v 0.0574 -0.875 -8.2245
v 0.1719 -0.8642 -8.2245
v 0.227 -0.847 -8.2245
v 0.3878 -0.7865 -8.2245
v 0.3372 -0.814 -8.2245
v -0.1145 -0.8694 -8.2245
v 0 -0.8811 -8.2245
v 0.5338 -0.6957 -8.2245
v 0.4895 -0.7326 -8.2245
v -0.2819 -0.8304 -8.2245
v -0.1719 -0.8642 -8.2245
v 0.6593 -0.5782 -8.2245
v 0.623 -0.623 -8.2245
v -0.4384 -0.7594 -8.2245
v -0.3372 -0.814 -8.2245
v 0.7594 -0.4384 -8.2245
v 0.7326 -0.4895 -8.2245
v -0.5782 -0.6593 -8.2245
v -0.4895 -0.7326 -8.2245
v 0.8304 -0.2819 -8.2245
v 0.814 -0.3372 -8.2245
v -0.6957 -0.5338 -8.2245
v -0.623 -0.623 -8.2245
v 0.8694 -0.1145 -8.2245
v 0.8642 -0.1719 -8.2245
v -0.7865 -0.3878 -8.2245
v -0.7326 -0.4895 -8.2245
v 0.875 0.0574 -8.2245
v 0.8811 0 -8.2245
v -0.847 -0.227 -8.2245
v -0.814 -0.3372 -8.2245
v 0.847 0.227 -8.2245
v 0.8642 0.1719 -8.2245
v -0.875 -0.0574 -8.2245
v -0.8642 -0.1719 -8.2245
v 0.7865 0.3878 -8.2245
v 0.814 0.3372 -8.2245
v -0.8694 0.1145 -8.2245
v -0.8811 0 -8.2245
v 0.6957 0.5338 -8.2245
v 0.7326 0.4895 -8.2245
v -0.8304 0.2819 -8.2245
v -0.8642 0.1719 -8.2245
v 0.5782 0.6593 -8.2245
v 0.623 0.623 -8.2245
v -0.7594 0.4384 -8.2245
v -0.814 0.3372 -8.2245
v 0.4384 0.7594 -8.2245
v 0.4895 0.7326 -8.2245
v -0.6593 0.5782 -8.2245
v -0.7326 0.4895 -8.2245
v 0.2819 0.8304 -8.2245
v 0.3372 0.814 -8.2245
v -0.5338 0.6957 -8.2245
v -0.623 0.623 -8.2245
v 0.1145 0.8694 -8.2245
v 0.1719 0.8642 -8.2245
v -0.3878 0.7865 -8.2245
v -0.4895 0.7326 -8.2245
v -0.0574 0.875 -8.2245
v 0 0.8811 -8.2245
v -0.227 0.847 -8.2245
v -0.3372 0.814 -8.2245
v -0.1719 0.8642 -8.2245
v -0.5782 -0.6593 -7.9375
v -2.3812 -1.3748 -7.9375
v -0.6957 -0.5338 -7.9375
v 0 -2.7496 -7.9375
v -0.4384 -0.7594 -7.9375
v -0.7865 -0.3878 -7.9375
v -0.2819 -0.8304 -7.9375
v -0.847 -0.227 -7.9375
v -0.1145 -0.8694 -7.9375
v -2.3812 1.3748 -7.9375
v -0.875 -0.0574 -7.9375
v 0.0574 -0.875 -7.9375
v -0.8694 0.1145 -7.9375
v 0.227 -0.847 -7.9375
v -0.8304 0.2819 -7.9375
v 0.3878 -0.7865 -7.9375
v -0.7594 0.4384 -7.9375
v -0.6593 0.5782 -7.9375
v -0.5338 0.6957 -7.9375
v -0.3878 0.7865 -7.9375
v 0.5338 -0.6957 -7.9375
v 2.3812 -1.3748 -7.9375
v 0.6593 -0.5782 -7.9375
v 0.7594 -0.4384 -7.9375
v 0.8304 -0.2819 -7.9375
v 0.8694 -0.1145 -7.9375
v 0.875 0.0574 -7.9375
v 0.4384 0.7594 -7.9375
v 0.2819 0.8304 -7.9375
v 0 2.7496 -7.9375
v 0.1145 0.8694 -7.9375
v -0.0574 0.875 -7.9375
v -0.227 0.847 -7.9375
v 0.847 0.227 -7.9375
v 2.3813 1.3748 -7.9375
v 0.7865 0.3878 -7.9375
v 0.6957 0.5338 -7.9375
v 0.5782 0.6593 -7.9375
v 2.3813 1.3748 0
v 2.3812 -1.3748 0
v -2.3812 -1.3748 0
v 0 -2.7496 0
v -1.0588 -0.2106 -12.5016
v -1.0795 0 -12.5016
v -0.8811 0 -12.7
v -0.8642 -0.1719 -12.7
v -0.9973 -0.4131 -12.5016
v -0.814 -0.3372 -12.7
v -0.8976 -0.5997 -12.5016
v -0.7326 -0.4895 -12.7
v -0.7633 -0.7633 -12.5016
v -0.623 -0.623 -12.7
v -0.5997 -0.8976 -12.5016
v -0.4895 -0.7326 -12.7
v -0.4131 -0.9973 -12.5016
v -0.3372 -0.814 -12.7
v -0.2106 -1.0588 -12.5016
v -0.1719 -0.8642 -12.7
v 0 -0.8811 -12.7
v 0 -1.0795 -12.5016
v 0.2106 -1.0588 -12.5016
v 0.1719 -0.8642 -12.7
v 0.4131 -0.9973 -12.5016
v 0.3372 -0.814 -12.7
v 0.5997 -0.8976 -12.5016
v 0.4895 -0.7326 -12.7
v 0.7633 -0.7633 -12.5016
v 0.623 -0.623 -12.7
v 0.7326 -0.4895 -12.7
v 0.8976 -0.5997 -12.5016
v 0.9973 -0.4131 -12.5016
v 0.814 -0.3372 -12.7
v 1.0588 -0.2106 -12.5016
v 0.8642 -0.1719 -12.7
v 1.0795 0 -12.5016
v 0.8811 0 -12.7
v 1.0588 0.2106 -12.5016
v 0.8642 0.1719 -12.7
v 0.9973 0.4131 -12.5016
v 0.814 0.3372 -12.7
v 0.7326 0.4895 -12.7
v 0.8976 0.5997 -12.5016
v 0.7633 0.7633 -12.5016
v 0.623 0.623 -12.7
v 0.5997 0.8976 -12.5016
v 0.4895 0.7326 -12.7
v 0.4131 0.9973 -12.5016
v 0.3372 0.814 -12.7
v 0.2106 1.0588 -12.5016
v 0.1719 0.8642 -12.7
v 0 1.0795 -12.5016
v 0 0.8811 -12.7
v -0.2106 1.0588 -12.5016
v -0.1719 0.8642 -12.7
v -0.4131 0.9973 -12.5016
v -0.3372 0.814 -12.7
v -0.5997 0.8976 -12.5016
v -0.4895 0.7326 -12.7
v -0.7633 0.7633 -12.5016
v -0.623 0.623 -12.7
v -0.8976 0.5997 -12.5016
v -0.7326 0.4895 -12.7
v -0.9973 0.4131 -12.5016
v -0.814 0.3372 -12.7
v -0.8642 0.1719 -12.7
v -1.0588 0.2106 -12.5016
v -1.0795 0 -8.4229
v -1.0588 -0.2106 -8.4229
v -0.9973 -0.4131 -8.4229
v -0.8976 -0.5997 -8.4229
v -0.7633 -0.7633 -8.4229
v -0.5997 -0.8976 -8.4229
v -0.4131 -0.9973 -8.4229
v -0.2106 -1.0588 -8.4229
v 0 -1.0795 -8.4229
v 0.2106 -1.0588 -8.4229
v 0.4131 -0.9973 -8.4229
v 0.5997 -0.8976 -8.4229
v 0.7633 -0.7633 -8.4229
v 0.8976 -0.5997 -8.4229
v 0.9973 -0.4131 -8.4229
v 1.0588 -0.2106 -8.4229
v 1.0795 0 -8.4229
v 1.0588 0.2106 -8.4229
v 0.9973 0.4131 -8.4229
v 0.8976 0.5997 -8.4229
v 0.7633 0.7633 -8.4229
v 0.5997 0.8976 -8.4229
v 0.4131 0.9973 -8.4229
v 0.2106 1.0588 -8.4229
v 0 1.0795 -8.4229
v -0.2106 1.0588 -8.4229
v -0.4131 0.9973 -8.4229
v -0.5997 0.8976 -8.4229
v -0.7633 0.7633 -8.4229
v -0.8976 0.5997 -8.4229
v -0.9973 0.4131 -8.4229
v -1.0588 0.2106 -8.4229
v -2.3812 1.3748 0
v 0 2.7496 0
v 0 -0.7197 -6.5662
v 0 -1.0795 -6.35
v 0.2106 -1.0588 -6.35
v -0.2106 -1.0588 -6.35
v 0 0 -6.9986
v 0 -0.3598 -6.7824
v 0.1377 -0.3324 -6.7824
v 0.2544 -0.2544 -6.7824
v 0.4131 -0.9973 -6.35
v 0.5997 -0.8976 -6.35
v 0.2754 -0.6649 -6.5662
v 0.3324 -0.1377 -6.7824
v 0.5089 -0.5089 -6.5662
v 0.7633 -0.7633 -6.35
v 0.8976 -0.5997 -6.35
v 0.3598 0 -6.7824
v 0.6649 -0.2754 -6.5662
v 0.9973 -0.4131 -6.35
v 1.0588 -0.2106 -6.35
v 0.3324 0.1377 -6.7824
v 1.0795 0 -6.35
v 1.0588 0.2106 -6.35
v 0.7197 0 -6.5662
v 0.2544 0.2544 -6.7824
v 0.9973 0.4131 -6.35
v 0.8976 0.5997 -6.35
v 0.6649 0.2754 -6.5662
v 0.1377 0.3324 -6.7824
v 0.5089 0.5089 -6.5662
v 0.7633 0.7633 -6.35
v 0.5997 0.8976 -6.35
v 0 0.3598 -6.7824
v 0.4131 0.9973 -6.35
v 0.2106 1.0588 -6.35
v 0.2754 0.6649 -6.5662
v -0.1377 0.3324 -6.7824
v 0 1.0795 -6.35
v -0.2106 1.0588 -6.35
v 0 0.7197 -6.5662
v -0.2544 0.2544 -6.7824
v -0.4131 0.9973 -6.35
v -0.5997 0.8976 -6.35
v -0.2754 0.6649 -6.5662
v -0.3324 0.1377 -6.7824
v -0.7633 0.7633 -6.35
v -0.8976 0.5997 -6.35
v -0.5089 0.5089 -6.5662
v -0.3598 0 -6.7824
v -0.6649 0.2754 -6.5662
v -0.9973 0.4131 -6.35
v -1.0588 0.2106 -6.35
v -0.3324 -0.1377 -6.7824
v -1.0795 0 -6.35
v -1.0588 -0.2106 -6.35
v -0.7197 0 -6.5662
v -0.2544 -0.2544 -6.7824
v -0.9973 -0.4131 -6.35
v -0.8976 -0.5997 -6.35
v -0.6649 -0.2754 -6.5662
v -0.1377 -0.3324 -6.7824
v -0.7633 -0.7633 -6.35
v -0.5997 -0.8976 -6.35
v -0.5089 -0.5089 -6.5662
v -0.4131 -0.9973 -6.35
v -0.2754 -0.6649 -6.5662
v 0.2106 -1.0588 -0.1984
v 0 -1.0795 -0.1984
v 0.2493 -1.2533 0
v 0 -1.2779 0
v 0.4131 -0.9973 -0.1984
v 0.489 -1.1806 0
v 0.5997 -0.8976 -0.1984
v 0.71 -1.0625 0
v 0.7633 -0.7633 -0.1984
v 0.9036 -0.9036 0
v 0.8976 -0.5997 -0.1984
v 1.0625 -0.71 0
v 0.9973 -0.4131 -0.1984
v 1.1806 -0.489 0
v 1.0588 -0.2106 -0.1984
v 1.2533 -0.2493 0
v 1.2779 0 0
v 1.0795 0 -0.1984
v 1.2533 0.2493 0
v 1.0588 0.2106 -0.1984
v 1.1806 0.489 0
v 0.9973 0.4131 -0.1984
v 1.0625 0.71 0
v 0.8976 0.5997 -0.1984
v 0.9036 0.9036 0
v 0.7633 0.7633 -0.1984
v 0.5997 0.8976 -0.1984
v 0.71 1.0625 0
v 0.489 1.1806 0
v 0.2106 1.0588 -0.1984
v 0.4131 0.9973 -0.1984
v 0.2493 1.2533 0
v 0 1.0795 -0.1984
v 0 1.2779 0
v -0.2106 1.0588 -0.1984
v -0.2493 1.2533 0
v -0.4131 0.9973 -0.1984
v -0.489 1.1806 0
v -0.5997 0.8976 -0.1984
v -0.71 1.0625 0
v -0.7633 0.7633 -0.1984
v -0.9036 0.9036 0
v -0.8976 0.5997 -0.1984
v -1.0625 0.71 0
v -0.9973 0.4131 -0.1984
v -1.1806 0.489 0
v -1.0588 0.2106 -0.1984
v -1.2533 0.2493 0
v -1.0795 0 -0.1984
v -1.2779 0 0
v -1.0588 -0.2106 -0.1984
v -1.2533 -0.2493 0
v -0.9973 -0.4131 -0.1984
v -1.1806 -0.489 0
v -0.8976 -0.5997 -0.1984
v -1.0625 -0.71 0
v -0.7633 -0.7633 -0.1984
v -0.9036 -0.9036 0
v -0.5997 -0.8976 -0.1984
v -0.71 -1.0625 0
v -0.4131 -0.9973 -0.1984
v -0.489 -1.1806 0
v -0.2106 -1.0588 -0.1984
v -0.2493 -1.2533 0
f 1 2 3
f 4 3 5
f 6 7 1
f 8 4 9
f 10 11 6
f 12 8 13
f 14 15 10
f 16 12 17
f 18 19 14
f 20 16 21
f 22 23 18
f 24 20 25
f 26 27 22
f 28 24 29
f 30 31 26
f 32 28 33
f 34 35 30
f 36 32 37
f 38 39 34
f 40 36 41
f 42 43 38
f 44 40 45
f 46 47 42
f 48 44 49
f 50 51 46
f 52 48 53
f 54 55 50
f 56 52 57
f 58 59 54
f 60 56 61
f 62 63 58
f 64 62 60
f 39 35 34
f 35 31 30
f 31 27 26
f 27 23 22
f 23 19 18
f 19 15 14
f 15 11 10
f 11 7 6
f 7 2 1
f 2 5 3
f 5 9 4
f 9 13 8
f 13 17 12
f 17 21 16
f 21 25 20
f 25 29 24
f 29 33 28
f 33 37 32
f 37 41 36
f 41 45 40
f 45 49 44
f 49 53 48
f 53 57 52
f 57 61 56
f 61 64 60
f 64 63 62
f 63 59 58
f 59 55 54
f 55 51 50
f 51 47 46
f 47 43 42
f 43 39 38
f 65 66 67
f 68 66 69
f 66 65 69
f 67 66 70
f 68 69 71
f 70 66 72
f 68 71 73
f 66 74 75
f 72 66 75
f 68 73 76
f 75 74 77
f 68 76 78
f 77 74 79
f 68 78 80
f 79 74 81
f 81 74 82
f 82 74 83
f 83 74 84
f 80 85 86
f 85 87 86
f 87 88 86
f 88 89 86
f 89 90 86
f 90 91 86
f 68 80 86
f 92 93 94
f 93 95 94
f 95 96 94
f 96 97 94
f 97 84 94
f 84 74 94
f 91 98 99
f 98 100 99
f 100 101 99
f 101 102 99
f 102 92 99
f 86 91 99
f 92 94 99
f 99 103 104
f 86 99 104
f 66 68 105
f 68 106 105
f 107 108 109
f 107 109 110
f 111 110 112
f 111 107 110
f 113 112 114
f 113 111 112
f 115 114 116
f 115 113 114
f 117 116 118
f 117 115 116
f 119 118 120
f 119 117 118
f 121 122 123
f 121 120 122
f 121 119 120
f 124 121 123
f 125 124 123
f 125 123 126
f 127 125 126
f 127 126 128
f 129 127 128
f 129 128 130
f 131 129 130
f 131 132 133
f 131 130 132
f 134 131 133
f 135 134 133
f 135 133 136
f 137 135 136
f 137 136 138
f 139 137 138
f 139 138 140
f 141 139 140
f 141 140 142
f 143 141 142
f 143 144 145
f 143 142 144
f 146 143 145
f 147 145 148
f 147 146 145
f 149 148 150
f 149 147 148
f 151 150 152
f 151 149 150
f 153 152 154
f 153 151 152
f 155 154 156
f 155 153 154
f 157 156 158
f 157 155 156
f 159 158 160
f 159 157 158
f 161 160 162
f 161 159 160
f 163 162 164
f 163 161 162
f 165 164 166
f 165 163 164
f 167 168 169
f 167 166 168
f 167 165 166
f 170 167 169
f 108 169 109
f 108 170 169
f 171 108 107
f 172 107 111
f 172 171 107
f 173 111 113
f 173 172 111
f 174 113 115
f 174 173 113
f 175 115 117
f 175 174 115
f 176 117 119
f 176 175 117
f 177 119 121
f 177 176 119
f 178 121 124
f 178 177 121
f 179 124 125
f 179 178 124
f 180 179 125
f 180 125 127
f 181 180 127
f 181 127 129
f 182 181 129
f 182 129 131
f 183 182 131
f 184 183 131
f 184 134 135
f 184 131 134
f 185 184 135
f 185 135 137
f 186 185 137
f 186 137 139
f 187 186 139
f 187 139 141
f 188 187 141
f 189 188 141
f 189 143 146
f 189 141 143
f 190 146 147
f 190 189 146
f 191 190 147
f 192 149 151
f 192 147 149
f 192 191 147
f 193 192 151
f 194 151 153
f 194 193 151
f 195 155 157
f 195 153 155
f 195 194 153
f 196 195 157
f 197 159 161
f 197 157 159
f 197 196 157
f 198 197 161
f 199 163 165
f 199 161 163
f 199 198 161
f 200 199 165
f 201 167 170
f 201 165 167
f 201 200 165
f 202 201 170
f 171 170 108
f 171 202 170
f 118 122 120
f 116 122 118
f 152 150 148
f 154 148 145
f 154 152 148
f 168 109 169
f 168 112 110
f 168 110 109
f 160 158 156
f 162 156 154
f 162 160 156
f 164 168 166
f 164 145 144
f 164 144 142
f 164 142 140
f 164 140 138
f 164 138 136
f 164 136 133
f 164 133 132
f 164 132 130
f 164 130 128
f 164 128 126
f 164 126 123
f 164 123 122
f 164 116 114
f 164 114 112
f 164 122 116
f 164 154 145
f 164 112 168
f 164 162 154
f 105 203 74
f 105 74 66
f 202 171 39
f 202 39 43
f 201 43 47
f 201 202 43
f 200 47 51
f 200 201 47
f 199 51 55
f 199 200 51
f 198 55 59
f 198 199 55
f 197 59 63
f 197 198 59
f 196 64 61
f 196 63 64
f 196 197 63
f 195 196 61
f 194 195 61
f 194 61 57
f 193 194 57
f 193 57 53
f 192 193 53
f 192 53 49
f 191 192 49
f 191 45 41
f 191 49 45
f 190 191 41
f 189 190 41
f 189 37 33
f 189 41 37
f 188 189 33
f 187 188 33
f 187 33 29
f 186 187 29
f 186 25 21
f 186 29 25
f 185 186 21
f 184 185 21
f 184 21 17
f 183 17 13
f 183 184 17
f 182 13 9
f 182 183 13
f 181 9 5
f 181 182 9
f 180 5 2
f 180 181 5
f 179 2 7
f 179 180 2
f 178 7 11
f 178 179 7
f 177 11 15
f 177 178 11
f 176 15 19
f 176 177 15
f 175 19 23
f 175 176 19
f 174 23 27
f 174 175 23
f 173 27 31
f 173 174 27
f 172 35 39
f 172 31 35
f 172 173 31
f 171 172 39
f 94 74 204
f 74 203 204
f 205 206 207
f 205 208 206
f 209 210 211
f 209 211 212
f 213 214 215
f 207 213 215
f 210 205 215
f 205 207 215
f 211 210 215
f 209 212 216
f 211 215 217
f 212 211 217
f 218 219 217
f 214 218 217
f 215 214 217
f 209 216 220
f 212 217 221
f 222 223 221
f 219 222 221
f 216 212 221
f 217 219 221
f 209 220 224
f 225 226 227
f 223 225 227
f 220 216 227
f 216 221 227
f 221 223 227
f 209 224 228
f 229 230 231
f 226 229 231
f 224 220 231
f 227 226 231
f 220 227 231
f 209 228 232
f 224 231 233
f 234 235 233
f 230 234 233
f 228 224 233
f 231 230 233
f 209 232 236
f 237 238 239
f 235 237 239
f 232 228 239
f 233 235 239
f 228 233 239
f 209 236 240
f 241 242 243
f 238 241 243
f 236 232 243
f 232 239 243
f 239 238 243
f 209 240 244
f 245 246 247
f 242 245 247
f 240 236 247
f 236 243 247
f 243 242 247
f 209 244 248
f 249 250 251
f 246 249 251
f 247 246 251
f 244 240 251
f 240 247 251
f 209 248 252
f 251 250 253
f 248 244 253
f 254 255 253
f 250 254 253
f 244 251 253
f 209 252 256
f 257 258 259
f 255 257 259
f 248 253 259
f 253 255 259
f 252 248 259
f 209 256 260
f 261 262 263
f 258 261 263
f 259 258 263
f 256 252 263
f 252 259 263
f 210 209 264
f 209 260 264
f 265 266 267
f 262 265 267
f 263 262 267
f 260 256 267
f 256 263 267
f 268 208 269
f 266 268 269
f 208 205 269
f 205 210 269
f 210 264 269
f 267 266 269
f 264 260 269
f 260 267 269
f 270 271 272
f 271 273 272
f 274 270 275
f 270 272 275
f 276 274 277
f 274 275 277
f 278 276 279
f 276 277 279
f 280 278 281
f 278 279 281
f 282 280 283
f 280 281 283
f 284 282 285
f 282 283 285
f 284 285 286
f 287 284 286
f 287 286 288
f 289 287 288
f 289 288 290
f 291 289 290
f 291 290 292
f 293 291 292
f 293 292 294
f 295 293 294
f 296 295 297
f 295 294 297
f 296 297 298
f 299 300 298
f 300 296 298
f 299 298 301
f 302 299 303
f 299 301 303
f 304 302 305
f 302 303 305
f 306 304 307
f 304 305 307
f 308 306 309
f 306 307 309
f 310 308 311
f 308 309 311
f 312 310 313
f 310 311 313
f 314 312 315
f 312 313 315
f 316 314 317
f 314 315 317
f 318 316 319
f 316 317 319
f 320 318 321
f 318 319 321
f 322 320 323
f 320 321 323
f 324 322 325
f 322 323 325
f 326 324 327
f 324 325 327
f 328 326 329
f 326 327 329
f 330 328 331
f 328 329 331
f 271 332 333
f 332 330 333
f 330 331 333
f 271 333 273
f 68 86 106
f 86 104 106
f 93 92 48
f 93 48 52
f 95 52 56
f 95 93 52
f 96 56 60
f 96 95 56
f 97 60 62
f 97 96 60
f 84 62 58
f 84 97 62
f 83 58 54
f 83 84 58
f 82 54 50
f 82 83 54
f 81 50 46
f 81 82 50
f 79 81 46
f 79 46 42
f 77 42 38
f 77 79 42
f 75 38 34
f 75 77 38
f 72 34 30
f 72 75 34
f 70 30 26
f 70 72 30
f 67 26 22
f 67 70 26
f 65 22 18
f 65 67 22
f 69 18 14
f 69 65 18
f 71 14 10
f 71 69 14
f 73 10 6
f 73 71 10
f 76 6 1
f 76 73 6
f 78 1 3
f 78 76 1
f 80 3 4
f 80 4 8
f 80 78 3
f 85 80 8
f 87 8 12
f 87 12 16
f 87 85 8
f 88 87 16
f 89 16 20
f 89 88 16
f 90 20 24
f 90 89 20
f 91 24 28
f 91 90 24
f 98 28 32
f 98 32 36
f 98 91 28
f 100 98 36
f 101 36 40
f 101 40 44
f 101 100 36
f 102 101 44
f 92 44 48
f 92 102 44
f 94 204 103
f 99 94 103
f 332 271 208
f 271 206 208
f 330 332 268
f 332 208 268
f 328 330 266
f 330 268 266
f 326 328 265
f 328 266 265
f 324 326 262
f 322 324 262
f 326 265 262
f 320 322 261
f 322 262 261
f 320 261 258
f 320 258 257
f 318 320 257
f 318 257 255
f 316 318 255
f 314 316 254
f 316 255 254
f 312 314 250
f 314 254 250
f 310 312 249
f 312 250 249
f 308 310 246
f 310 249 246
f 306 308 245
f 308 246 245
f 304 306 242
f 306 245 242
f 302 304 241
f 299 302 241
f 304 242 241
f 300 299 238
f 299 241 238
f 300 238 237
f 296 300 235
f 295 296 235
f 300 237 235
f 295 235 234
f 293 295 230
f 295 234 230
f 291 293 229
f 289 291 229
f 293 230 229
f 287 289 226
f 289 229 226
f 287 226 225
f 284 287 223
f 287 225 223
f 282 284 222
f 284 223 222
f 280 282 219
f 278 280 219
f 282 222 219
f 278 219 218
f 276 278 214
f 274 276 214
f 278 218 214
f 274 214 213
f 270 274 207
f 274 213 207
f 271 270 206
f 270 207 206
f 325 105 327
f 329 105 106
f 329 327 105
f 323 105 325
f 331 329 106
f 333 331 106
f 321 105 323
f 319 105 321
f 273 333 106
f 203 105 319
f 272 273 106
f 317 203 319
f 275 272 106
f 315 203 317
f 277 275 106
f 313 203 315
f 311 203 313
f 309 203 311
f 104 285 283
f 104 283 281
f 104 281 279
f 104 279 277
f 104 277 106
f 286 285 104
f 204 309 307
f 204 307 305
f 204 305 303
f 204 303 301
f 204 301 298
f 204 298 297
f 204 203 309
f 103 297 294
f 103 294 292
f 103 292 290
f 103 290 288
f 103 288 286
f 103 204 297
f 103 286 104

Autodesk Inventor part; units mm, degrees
ref_plane "YZ Plane" through (0, 0, 0) normal (1, 0, 0) x (0, 1, 0)
ref_plane "XZ Plane" through (0, 0, 0) normal (0, 1, 0) x (-1, 0, 0)
sketch "Sketch2" plane through (0, 0, 0) normal (0, 0, 1) x (1, 0, 0)
  line L0 (2.3813, 1.3748) -> (2.3812, -1.3748)
  line L1 (2.3812, -1.3748) -> (0, -2.7496)
  line L2 (0, -2.7496) -> (-2.3812, -1.3748)
  line L3 (-2.3812, 1.3748) -> (-2.3812, -1.3748)
  line L4 (-2.3812, 1.3748) -> (0, 2.7496)
  line L5 (0, 2.7496) -> (2.3813, 1.3748)
  circle A0 centre (0, 0) radius 2.7496 construction
  line L6 (0, 25.4) -> (0, -25.4) construction
  dimension "d3" = 4.7625
extrude "Hexagon1" add sketch "Sketch2" against normal blind 7.9375
sketch "Sketch3" plane through (0, 0, -7.9375) normal (0, 0, -1) x (-1, 0, 0)
  circle A0 centre (0, 0) radius 1.0795
  dimension "d11" = 2.159
sketch "Sketch4" plane through (0, 0, 0) normal (0, 0, 1) x (1, 0, 0)
  point P0 (0, 0)
hole "Hole1" at (0, 0, 0) direction (0, 0, -1) diameter 2.159 depth 6.35 tip angle 118
extrude "Extrusion2" add sketch "Sketch3" along normal blind 4.7625
chamfer "Chamfer1" distance 0.1984 angle 45 1 edges at (1.0795, 0, -12.7)
chamfer "Chamfer2" distance 0.1984 angle 45 1 edges at (0, 1.0795, 0)
thread "Thread1" size "2-56 UNC" class "2A" standard "ANSI Unified Screw Threads" full length
ref_plane "Work Plane1" through (0, 0, -12.6008) normal (0.866, -0.5, 0) x (0, 0, 1)
sketch "Sketch5" plane through (0, 0, -12.6008) normal (0.866, -0.5, 0) x (0, 0, 1)
  line L0 (4.6633, 0) -> (4.6633, -2.3812) projected
  line L1 (4.6633, -1.0795) -> (0.0992, -1.0795) projected
  line L2 (4.6633, -1.0795) -> (4.3763, -1.0795)
  line L3 (4.3763, -1.0795) -> (4.3763, -0.8769)
  line L4 (4.3763, -0.8769) -> (4.6633, -0.8769)
  line L5 (4.6633, -0.8769) -> (4.6633, -1.0795)
  line L6 (-2.6392, 0) -> (15.1408, 0) projected
revolve "Revolution1" cut sketch "Sketch5" angle 360 about axis through (0, 0, -10) along (0, 0, 1)
chamfer "Chamfer3" distance 0.1984 angle 45 1 edges at (1.0795, 0, -8.2244)
properties part number "219-1048" material "Steel, Mild"
